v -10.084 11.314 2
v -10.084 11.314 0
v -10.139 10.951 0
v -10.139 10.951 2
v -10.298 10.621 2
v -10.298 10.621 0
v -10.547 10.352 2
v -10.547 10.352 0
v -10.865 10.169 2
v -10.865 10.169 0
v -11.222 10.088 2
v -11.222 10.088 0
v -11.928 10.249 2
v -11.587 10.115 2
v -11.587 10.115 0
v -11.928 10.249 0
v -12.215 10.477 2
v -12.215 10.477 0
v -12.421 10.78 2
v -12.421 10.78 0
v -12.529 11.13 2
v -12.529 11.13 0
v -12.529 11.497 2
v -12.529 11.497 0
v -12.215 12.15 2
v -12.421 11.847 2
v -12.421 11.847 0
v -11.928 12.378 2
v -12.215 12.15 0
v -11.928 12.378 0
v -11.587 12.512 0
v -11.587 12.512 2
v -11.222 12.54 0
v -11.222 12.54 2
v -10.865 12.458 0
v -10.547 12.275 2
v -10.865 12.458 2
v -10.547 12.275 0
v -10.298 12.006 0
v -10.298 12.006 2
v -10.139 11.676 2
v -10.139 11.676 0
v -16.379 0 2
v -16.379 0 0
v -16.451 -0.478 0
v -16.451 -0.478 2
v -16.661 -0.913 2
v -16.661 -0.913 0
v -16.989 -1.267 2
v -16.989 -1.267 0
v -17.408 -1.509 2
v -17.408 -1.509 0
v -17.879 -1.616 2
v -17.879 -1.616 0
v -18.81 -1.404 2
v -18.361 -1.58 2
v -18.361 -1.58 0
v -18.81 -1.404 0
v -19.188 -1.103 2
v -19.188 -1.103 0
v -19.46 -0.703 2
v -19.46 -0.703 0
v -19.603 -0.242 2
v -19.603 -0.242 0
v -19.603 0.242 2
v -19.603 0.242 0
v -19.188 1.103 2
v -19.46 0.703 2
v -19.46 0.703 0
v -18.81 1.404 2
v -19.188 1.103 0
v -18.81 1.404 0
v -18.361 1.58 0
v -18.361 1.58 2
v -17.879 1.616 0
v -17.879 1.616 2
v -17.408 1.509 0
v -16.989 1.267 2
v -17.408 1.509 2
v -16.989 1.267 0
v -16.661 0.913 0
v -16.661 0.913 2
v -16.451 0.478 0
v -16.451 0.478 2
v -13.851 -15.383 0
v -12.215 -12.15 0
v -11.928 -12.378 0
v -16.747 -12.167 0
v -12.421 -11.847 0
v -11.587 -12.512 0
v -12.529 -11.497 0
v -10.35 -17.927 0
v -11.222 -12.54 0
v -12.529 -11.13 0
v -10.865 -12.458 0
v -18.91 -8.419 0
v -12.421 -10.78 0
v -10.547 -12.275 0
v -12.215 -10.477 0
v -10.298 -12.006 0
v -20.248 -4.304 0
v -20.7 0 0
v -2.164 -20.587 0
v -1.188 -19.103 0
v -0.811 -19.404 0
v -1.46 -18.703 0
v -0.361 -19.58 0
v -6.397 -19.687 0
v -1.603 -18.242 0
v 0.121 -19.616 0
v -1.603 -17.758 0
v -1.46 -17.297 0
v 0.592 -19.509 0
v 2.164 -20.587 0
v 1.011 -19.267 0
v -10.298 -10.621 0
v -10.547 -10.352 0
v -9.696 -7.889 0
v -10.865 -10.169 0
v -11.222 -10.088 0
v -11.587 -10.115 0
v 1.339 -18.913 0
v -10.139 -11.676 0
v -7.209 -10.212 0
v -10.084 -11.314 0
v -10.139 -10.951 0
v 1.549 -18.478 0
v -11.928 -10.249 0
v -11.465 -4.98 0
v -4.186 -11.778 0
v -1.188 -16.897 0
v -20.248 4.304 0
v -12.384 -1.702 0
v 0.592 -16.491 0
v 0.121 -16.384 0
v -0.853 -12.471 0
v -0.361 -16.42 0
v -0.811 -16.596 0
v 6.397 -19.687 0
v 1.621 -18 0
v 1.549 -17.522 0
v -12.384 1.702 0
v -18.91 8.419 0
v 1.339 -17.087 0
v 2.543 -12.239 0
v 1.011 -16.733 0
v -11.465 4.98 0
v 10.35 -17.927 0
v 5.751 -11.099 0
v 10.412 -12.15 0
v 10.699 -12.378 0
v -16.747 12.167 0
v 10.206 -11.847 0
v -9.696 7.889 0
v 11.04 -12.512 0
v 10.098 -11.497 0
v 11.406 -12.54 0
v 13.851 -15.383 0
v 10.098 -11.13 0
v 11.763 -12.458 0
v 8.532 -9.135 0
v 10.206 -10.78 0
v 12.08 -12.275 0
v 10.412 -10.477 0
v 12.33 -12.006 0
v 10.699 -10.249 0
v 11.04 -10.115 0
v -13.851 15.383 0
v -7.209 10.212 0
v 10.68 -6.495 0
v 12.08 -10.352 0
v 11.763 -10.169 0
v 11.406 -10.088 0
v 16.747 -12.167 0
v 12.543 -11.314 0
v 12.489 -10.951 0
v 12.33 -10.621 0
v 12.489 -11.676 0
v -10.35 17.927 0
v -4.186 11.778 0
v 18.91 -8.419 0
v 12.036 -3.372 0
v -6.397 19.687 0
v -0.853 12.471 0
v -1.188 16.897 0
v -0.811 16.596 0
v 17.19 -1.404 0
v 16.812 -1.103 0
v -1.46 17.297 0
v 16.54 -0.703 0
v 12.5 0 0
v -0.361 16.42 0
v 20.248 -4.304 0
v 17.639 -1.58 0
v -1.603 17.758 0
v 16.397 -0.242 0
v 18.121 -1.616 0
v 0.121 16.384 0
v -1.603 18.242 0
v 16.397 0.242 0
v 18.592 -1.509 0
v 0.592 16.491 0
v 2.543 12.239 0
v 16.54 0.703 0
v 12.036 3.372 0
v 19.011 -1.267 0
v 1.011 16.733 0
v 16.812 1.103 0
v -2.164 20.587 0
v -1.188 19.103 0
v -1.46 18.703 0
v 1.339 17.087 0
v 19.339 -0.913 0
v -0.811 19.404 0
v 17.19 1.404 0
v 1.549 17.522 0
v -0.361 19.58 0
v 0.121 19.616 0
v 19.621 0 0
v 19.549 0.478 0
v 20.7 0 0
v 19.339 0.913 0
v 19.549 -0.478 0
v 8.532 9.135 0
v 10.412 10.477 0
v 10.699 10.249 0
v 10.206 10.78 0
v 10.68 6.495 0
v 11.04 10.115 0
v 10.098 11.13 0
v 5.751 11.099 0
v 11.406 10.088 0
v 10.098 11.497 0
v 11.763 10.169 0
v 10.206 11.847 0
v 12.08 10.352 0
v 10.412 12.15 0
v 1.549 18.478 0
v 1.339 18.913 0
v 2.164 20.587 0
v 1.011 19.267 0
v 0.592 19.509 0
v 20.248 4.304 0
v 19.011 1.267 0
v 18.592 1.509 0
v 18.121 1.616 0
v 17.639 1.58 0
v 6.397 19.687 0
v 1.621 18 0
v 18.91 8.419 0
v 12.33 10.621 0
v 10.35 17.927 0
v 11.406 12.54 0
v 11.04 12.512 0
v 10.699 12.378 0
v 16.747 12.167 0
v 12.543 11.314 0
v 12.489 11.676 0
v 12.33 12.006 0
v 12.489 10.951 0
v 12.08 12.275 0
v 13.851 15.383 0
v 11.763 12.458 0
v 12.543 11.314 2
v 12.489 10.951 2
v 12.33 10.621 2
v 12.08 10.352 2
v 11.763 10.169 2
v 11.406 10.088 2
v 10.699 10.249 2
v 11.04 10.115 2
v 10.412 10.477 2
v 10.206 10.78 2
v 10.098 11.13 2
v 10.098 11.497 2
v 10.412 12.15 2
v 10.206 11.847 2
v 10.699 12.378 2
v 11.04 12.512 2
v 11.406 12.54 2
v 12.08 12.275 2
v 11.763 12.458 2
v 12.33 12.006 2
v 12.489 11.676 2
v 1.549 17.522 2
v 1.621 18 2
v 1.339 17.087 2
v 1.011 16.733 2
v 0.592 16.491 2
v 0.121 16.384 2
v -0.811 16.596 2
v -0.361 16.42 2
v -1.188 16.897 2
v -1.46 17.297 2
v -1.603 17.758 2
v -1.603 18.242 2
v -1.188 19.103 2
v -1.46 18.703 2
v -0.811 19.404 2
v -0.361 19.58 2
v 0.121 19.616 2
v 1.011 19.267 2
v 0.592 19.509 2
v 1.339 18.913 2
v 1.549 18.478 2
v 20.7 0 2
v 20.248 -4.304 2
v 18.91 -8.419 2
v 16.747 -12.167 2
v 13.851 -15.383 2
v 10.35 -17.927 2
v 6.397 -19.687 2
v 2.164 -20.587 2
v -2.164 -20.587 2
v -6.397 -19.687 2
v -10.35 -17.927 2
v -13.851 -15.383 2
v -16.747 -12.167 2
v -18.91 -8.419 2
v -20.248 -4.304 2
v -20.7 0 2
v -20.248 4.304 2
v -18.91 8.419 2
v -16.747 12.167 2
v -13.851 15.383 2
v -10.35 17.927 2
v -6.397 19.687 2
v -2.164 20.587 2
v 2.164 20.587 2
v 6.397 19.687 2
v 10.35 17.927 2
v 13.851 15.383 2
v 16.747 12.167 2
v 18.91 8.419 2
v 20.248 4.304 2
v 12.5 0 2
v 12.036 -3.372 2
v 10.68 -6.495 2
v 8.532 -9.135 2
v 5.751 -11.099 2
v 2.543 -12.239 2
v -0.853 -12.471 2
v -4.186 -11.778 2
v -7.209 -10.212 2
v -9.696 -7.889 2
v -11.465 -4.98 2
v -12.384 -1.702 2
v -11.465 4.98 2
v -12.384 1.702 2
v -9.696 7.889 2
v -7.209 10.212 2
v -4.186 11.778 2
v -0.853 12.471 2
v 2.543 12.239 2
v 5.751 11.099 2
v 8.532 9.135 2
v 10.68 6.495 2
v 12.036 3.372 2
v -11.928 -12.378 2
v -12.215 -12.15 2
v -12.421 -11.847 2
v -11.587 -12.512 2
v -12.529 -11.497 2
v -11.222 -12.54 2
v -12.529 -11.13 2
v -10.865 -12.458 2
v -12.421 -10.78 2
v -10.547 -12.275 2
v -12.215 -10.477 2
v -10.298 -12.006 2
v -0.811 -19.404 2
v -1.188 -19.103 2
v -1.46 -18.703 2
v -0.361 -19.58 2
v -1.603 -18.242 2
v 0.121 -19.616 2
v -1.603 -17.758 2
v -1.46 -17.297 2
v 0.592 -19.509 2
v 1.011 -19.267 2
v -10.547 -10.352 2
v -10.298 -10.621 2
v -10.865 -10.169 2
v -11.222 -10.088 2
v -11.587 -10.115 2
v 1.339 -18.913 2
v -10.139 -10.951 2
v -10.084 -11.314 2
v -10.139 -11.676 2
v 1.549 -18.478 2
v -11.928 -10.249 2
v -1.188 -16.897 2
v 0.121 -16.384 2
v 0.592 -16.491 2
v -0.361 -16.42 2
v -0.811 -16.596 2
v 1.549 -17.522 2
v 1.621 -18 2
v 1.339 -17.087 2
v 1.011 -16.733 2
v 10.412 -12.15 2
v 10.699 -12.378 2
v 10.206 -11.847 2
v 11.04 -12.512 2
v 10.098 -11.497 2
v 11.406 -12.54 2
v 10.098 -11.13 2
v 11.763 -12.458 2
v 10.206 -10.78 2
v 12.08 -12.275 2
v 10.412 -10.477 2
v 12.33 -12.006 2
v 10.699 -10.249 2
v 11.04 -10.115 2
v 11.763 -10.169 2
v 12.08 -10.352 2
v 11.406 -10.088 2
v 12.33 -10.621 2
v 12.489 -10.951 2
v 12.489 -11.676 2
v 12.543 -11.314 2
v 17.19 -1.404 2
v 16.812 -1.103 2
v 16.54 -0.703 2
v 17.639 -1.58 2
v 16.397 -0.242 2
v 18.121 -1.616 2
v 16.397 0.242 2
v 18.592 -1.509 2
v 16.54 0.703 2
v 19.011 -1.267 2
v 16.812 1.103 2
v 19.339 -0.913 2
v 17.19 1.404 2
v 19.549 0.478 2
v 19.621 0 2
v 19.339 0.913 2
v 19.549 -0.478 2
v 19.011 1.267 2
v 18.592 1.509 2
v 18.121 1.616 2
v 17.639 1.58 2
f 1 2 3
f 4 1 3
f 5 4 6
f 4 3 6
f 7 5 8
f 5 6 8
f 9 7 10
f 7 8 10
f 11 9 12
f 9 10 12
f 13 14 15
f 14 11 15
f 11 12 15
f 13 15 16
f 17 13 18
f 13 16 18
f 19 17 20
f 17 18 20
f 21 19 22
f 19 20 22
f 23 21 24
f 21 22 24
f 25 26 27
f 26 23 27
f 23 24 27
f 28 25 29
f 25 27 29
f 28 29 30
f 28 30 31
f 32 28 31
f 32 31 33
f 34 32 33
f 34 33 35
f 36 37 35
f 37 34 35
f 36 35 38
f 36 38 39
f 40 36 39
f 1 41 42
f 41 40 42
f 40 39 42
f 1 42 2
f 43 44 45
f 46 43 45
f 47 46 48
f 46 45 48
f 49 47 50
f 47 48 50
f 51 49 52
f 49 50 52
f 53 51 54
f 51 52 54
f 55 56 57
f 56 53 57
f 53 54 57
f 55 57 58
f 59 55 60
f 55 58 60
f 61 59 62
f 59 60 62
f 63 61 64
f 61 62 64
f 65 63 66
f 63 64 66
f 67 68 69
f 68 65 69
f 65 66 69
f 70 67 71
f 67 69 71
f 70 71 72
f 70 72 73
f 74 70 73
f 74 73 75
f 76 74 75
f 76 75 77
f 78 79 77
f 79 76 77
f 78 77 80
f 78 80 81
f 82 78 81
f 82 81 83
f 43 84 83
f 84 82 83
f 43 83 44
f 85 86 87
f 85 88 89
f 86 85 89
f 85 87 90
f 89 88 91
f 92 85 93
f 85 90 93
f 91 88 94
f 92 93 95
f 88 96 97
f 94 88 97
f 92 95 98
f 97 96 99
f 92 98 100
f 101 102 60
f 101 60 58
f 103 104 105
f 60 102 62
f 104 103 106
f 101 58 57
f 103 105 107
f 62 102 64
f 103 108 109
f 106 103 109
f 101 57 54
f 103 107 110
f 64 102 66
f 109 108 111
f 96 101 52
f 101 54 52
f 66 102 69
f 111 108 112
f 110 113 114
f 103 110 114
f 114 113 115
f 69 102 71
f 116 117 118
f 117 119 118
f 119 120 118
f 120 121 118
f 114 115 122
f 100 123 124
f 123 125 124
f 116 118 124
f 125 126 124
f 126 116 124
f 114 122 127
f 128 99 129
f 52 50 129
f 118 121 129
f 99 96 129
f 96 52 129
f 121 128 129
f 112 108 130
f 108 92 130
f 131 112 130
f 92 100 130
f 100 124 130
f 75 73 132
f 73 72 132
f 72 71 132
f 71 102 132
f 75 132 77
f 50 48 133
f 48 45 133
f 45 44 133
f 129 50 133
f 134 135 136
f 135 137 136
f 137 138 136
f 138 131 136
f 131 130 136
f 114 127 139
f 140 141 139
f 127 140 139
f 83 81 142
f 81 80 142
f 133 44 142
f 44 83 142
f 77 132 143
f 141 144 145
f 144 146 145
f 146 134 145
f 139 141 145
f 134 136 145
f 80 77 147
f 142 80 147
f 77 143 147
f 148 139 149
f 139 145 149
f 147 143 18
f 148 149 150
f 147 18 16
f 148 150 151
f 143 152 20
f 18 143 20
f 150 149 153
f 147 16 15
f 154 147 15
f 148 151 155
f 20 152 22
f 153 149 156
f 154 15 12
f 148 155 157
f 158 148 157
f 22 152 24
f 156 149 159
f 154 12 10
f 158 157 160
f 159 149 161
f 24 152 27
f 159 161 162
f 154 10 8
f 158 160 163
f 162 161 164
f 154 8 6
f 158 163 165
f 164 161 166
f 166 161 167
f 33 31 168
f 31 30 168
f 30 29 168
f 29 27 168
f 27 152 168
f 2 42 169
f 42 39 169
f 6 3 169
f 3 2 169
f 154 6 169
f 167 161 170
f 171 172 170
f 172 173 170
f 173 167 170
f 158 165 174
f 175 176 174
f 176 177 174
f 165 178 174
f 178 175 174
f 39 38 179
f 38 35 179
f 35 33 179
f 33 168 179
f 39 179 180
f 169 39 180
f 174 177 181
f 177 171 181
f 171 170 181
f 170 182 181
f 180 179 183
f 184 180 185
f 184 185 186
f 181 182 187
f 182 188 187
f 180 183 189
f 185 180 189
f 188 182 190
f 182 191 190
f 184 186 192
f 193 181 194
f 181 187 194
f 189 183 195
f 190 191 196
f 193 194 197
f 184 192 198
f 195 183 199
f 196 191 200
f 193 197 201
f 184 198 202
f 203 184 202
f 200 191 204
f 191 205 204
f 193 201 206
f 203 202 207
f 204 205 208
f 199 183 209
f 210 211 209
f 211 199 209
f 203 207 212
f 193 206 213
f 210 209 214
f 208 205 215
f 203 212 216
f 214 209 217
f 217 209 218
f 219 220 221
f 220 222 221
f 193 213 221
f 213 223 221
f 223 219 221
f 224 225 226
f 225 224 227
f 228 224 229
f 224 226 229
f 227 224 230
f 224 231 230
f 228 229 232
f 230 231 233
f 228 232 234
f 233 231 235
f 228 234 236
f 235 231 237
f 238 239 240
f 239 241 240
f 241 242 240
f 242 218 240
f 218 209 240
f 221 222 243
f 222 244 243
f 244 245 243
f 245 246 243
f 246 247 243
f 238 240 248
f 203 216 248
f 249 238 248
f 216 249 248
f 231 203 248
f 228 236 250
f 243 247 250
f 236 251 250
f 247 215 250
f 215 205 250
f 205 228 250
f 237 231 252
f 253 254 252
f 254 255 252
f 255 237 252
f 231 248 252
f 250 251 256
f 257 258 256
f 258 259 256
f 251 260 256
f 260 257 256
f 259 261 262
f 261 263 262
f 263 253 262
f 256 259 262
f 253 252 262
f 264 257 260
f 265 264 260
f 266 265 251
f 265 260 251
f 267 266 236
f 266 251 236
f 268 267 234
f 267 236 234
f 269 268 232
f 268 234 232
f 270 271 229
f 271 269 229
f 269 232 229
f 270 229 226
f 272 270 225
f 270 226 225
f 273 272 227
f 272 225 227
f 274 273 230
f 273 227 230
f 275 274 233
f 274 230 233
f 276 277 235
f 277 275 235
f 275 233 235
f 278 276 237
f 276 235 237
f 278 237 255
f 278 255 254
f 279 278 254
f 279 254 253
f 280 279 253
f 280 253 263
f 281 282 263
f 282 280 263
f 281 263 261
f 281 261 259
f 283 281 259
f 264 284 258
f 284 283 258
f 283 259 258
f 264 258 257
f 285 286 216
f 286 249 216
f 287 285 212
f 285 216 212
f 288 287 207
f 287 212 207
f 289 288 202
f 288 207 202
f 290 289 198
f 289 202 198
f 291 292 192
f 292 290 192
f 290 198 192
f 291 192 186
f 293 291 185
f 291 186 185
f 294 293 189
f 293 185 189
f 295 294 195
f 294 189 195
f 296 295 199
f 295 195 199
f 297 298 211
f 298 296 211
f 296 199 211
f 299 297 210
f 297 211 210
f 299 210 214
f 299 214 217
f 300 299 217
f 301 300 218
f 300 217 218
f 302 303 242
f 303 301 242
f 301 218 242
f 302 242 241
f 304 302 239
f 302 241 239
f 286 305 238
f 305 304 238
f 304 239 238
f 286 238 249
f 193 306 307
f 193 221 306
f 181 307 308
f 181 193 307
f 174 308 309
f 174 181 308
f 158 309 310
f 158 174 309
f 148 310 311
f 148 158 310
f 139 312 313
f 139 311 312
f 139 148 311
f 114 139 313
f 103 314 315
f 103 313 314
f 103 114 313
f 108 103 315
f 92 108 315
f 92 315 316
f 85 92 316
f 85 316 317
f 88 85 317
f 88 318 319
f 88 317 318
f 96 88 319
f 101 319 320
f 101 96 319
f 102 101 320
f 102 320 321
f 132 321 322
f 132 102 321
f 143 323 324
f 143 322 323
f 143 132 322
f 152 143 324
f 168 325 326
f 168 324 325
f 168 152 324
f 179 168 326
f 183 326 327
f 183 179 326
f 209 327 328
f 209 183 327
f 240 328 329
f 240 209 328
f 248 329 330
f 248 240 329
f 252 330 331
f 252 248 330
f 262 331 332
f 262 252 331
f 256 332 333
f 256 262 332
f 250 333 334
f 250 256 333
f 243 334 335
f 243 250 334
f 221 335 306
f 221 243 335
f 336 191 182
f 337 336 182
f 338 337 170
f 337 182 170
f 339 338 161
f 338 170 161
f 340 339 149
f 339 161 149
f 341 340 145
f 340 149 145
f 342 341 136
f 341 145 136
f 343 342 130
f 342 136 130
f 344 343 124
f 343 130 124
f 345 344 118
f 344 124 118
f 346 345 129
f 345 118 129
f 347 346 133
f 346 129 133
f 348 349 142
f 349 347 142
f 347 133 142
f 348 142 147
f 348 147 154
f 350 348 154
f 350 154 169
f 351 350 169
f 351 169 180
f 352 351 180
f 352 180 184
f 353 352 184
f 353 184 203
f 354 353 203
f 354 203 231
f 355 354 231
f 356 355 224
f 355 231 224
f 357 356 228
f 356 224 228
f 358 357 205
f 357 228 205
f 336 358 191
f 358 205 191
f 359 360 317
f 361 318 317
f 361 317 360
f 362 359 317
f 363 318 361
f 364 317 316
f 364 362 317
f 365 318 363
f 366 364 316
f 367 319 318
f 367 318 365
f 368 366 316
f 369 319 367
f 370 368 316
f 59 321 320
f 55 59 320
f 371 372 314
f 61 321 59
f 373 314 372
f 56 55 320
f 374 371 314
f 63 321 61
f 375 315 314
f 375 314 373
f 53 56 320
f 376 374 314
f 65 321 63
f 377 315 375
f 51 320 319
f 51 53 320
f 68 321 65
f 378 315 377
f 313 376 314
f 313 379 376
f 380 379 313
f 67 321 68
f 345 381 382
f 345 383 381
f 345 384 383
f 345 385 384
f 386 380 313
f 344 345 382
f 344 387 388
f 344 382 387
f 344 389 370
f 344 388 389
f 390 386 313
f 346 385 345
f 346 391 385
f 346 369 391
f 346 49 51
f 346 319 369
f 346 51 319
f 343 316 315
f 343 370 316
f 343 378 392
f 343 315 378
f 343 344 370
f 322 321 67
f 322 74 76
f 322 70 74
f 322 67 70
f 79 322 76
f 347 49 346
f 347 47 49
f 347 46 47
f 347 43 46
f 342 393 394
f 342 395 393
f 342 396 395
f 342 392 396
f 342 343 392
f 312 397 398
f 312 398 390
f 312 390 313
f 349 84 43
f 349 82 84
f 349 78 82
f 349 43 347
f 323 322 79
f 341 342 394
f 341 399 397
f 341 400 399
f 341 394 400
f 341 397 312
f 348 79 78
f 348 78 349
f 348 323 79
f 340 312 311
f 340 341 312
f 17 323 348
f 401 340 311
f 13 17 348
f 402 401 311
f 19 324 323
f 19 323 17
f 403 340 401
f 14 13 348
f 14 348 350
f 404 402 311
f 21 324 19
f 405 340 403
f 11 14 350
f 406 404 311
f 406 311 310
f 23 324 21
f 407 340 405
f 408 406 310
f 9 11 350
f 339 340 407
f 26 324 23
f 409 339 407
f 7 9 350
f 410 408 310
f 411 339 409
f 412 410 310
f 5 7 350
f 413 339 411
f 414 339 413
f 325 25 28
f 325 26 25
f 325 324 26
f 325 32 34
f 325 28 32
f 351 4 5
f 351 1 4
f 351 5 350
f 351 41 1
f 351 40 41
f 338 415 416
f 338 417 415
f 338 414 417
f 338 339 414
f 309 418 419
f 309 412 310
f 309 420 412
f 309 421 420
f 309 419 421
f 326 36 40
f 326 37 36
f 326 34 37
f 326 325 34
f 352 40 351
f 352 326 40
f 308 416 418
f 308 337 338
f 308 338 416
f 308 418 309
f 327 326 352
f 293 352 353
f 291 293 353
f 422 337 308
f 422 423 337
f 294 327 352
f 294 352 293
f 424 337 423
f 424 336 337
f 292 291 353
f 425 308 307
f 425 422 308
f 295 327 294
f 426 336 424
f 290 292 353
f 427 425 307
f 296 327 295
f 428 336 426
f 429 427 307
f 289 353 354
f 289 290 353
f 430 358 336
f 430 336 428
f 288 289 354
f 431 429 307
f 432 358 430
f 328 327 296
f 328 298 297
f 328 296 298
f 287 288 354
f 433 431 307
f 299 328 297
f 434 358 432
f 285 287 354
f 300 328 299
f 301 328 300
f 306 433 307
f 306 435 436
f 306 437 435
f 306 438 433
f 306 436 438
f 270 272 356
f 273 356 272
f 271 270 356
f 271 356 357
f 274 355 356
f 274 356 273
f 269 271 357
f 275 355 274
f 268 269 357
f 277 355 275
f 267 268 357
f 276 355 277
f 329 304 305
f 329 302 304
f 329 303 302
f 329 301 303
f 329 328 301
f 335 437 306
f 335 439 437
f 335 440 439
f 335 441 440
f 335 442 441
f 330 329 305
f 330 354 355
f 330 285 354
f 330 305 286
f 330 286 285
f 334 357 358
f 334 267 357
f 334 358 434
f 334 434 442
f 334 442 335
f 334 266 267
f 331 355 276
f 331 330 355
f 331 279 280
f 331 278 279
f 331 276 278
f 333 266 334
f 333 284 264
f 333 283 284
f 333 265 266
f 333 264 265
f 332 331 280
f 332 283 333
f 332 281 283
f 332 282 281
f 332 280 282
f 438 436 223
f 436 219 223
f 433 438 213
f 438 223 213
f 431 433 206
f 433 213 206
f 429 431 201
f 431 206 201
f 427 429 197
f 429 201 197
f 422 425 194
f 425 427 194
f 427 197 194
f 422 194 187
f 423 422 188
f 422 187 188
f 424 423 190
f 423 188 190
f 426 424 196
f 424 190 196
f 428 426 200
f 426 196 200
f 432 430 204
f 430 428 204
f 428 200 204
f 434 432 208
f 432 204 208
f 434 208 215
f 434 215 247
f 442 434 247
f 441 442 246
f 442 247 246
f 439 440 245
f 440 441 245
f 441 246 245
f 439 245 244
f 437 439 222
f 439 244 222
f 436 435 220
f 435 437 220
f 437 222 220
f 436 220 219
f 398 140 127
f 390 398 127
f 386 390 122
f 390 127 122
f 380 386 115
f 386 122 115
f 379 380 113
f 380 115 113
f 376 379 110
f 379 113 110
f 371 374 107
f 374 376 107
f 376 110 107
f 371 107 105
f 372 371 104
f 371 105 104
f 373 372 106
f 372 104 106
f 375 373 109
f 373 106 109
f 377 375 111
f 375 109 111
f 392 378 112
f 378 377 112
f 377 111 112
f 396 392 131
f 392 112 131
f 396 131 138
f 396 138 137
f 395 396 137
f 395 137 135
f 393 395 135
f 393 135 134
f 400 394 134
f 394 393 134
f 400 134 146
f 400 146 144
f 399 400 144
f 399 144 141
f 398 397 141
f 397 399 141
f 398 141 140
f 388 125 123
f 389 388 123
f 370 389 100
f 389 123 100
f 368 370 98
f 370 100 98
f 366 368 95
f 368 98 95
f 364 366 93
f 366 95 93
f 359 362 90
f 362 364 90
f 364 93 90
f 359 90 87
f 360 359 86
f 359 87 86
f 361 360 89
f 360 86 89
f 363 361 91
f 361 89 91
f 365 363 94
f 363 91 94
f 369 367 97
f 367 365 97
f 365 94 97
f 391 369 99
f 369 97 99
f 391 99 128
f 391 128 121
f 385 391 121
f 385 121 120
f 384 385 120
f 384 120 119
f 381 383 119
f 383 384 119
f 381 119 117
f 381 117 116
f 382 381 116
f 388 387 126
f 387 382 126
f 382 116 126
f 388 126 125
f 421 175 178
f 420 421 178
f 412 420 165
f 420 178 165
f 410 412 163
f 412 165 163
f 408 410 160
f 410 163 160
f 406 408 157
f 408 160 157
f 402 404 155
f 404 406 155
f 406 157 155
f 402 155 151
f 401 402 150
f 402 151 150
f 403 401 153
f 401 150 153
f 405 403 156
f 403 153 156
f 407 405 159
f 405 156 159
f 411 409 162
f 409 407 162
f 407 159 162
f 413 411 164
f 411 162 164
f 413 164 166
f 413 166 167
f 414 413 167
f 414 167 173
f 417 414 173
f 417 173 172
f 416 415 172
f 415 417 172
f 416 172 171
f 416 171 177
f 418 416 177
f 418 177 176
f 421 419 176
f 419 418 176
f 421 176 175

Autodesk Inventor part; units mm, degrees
ref_plane "YZ Plane" through (0, 0, 0) normal (1, 0, 0) x (0, 1, 0)
ref_plane "Work Plane1" through (0, 0, 0) normal (0, 0, 1) x (1, 0, 0)
sketch "Sketch1" plane through (0, 0, 0) normal (0, 0, 1) x (1, 0, 0)
  circle A0 centre (0, 0) radius 12.5 projected
  circle A1 centre (0, -18) radius 2 projected
  circle A2 centre (0, 18) radius 2 projected
  circle A3 centre (-18, 0) radius 2 projected
  circle A4 centre (18, 0) radius 2 projected
  circle A5 centre (11.3137, 11.3137) radius 1.6 projected
  circle A6 centre (-11.3137, -11.3137) radius 1.6 projected
  circle A7 centre (-11.3137, 11.3137) radius 1.6 projected
  circle A8 centre (11.3137, -11.3137) radius 1.6 projected
  circle A9 centre (0, 0) radius 20.7 projected
  circle A10 centre (-11.3137, 11.3137) radius 1.2295
  circle A11 centre (0, 18) radius 1.621
  circle A12 centre (11.3137, 11.3137) radius 1.2295
  circle A13 centre (18, 0) radius 1.621
  circle A14 centre (11.3137, -11.3137) radius 1.2295
  circle A15 centre (-11.3137, -11.3137) radius 1.2295
  circle A16 centre (0, -18) radius 1.621
  circle A17 centre (-18, 0) radius 1.621
ref_plane "Work Plane2" through (-10.1976, -10.1976, 2) normal (0, 0, 1) x (0.910504, -0.4135003, 0)
extrude "Extrusion1" add sketch "Sketch1" along normal up to surface (2 mm away) contours A1 | A2 | A3 | A4 | A5 | A6 | A7 | A8 | A9
properties part number "gearboxspacer 2 mm"
